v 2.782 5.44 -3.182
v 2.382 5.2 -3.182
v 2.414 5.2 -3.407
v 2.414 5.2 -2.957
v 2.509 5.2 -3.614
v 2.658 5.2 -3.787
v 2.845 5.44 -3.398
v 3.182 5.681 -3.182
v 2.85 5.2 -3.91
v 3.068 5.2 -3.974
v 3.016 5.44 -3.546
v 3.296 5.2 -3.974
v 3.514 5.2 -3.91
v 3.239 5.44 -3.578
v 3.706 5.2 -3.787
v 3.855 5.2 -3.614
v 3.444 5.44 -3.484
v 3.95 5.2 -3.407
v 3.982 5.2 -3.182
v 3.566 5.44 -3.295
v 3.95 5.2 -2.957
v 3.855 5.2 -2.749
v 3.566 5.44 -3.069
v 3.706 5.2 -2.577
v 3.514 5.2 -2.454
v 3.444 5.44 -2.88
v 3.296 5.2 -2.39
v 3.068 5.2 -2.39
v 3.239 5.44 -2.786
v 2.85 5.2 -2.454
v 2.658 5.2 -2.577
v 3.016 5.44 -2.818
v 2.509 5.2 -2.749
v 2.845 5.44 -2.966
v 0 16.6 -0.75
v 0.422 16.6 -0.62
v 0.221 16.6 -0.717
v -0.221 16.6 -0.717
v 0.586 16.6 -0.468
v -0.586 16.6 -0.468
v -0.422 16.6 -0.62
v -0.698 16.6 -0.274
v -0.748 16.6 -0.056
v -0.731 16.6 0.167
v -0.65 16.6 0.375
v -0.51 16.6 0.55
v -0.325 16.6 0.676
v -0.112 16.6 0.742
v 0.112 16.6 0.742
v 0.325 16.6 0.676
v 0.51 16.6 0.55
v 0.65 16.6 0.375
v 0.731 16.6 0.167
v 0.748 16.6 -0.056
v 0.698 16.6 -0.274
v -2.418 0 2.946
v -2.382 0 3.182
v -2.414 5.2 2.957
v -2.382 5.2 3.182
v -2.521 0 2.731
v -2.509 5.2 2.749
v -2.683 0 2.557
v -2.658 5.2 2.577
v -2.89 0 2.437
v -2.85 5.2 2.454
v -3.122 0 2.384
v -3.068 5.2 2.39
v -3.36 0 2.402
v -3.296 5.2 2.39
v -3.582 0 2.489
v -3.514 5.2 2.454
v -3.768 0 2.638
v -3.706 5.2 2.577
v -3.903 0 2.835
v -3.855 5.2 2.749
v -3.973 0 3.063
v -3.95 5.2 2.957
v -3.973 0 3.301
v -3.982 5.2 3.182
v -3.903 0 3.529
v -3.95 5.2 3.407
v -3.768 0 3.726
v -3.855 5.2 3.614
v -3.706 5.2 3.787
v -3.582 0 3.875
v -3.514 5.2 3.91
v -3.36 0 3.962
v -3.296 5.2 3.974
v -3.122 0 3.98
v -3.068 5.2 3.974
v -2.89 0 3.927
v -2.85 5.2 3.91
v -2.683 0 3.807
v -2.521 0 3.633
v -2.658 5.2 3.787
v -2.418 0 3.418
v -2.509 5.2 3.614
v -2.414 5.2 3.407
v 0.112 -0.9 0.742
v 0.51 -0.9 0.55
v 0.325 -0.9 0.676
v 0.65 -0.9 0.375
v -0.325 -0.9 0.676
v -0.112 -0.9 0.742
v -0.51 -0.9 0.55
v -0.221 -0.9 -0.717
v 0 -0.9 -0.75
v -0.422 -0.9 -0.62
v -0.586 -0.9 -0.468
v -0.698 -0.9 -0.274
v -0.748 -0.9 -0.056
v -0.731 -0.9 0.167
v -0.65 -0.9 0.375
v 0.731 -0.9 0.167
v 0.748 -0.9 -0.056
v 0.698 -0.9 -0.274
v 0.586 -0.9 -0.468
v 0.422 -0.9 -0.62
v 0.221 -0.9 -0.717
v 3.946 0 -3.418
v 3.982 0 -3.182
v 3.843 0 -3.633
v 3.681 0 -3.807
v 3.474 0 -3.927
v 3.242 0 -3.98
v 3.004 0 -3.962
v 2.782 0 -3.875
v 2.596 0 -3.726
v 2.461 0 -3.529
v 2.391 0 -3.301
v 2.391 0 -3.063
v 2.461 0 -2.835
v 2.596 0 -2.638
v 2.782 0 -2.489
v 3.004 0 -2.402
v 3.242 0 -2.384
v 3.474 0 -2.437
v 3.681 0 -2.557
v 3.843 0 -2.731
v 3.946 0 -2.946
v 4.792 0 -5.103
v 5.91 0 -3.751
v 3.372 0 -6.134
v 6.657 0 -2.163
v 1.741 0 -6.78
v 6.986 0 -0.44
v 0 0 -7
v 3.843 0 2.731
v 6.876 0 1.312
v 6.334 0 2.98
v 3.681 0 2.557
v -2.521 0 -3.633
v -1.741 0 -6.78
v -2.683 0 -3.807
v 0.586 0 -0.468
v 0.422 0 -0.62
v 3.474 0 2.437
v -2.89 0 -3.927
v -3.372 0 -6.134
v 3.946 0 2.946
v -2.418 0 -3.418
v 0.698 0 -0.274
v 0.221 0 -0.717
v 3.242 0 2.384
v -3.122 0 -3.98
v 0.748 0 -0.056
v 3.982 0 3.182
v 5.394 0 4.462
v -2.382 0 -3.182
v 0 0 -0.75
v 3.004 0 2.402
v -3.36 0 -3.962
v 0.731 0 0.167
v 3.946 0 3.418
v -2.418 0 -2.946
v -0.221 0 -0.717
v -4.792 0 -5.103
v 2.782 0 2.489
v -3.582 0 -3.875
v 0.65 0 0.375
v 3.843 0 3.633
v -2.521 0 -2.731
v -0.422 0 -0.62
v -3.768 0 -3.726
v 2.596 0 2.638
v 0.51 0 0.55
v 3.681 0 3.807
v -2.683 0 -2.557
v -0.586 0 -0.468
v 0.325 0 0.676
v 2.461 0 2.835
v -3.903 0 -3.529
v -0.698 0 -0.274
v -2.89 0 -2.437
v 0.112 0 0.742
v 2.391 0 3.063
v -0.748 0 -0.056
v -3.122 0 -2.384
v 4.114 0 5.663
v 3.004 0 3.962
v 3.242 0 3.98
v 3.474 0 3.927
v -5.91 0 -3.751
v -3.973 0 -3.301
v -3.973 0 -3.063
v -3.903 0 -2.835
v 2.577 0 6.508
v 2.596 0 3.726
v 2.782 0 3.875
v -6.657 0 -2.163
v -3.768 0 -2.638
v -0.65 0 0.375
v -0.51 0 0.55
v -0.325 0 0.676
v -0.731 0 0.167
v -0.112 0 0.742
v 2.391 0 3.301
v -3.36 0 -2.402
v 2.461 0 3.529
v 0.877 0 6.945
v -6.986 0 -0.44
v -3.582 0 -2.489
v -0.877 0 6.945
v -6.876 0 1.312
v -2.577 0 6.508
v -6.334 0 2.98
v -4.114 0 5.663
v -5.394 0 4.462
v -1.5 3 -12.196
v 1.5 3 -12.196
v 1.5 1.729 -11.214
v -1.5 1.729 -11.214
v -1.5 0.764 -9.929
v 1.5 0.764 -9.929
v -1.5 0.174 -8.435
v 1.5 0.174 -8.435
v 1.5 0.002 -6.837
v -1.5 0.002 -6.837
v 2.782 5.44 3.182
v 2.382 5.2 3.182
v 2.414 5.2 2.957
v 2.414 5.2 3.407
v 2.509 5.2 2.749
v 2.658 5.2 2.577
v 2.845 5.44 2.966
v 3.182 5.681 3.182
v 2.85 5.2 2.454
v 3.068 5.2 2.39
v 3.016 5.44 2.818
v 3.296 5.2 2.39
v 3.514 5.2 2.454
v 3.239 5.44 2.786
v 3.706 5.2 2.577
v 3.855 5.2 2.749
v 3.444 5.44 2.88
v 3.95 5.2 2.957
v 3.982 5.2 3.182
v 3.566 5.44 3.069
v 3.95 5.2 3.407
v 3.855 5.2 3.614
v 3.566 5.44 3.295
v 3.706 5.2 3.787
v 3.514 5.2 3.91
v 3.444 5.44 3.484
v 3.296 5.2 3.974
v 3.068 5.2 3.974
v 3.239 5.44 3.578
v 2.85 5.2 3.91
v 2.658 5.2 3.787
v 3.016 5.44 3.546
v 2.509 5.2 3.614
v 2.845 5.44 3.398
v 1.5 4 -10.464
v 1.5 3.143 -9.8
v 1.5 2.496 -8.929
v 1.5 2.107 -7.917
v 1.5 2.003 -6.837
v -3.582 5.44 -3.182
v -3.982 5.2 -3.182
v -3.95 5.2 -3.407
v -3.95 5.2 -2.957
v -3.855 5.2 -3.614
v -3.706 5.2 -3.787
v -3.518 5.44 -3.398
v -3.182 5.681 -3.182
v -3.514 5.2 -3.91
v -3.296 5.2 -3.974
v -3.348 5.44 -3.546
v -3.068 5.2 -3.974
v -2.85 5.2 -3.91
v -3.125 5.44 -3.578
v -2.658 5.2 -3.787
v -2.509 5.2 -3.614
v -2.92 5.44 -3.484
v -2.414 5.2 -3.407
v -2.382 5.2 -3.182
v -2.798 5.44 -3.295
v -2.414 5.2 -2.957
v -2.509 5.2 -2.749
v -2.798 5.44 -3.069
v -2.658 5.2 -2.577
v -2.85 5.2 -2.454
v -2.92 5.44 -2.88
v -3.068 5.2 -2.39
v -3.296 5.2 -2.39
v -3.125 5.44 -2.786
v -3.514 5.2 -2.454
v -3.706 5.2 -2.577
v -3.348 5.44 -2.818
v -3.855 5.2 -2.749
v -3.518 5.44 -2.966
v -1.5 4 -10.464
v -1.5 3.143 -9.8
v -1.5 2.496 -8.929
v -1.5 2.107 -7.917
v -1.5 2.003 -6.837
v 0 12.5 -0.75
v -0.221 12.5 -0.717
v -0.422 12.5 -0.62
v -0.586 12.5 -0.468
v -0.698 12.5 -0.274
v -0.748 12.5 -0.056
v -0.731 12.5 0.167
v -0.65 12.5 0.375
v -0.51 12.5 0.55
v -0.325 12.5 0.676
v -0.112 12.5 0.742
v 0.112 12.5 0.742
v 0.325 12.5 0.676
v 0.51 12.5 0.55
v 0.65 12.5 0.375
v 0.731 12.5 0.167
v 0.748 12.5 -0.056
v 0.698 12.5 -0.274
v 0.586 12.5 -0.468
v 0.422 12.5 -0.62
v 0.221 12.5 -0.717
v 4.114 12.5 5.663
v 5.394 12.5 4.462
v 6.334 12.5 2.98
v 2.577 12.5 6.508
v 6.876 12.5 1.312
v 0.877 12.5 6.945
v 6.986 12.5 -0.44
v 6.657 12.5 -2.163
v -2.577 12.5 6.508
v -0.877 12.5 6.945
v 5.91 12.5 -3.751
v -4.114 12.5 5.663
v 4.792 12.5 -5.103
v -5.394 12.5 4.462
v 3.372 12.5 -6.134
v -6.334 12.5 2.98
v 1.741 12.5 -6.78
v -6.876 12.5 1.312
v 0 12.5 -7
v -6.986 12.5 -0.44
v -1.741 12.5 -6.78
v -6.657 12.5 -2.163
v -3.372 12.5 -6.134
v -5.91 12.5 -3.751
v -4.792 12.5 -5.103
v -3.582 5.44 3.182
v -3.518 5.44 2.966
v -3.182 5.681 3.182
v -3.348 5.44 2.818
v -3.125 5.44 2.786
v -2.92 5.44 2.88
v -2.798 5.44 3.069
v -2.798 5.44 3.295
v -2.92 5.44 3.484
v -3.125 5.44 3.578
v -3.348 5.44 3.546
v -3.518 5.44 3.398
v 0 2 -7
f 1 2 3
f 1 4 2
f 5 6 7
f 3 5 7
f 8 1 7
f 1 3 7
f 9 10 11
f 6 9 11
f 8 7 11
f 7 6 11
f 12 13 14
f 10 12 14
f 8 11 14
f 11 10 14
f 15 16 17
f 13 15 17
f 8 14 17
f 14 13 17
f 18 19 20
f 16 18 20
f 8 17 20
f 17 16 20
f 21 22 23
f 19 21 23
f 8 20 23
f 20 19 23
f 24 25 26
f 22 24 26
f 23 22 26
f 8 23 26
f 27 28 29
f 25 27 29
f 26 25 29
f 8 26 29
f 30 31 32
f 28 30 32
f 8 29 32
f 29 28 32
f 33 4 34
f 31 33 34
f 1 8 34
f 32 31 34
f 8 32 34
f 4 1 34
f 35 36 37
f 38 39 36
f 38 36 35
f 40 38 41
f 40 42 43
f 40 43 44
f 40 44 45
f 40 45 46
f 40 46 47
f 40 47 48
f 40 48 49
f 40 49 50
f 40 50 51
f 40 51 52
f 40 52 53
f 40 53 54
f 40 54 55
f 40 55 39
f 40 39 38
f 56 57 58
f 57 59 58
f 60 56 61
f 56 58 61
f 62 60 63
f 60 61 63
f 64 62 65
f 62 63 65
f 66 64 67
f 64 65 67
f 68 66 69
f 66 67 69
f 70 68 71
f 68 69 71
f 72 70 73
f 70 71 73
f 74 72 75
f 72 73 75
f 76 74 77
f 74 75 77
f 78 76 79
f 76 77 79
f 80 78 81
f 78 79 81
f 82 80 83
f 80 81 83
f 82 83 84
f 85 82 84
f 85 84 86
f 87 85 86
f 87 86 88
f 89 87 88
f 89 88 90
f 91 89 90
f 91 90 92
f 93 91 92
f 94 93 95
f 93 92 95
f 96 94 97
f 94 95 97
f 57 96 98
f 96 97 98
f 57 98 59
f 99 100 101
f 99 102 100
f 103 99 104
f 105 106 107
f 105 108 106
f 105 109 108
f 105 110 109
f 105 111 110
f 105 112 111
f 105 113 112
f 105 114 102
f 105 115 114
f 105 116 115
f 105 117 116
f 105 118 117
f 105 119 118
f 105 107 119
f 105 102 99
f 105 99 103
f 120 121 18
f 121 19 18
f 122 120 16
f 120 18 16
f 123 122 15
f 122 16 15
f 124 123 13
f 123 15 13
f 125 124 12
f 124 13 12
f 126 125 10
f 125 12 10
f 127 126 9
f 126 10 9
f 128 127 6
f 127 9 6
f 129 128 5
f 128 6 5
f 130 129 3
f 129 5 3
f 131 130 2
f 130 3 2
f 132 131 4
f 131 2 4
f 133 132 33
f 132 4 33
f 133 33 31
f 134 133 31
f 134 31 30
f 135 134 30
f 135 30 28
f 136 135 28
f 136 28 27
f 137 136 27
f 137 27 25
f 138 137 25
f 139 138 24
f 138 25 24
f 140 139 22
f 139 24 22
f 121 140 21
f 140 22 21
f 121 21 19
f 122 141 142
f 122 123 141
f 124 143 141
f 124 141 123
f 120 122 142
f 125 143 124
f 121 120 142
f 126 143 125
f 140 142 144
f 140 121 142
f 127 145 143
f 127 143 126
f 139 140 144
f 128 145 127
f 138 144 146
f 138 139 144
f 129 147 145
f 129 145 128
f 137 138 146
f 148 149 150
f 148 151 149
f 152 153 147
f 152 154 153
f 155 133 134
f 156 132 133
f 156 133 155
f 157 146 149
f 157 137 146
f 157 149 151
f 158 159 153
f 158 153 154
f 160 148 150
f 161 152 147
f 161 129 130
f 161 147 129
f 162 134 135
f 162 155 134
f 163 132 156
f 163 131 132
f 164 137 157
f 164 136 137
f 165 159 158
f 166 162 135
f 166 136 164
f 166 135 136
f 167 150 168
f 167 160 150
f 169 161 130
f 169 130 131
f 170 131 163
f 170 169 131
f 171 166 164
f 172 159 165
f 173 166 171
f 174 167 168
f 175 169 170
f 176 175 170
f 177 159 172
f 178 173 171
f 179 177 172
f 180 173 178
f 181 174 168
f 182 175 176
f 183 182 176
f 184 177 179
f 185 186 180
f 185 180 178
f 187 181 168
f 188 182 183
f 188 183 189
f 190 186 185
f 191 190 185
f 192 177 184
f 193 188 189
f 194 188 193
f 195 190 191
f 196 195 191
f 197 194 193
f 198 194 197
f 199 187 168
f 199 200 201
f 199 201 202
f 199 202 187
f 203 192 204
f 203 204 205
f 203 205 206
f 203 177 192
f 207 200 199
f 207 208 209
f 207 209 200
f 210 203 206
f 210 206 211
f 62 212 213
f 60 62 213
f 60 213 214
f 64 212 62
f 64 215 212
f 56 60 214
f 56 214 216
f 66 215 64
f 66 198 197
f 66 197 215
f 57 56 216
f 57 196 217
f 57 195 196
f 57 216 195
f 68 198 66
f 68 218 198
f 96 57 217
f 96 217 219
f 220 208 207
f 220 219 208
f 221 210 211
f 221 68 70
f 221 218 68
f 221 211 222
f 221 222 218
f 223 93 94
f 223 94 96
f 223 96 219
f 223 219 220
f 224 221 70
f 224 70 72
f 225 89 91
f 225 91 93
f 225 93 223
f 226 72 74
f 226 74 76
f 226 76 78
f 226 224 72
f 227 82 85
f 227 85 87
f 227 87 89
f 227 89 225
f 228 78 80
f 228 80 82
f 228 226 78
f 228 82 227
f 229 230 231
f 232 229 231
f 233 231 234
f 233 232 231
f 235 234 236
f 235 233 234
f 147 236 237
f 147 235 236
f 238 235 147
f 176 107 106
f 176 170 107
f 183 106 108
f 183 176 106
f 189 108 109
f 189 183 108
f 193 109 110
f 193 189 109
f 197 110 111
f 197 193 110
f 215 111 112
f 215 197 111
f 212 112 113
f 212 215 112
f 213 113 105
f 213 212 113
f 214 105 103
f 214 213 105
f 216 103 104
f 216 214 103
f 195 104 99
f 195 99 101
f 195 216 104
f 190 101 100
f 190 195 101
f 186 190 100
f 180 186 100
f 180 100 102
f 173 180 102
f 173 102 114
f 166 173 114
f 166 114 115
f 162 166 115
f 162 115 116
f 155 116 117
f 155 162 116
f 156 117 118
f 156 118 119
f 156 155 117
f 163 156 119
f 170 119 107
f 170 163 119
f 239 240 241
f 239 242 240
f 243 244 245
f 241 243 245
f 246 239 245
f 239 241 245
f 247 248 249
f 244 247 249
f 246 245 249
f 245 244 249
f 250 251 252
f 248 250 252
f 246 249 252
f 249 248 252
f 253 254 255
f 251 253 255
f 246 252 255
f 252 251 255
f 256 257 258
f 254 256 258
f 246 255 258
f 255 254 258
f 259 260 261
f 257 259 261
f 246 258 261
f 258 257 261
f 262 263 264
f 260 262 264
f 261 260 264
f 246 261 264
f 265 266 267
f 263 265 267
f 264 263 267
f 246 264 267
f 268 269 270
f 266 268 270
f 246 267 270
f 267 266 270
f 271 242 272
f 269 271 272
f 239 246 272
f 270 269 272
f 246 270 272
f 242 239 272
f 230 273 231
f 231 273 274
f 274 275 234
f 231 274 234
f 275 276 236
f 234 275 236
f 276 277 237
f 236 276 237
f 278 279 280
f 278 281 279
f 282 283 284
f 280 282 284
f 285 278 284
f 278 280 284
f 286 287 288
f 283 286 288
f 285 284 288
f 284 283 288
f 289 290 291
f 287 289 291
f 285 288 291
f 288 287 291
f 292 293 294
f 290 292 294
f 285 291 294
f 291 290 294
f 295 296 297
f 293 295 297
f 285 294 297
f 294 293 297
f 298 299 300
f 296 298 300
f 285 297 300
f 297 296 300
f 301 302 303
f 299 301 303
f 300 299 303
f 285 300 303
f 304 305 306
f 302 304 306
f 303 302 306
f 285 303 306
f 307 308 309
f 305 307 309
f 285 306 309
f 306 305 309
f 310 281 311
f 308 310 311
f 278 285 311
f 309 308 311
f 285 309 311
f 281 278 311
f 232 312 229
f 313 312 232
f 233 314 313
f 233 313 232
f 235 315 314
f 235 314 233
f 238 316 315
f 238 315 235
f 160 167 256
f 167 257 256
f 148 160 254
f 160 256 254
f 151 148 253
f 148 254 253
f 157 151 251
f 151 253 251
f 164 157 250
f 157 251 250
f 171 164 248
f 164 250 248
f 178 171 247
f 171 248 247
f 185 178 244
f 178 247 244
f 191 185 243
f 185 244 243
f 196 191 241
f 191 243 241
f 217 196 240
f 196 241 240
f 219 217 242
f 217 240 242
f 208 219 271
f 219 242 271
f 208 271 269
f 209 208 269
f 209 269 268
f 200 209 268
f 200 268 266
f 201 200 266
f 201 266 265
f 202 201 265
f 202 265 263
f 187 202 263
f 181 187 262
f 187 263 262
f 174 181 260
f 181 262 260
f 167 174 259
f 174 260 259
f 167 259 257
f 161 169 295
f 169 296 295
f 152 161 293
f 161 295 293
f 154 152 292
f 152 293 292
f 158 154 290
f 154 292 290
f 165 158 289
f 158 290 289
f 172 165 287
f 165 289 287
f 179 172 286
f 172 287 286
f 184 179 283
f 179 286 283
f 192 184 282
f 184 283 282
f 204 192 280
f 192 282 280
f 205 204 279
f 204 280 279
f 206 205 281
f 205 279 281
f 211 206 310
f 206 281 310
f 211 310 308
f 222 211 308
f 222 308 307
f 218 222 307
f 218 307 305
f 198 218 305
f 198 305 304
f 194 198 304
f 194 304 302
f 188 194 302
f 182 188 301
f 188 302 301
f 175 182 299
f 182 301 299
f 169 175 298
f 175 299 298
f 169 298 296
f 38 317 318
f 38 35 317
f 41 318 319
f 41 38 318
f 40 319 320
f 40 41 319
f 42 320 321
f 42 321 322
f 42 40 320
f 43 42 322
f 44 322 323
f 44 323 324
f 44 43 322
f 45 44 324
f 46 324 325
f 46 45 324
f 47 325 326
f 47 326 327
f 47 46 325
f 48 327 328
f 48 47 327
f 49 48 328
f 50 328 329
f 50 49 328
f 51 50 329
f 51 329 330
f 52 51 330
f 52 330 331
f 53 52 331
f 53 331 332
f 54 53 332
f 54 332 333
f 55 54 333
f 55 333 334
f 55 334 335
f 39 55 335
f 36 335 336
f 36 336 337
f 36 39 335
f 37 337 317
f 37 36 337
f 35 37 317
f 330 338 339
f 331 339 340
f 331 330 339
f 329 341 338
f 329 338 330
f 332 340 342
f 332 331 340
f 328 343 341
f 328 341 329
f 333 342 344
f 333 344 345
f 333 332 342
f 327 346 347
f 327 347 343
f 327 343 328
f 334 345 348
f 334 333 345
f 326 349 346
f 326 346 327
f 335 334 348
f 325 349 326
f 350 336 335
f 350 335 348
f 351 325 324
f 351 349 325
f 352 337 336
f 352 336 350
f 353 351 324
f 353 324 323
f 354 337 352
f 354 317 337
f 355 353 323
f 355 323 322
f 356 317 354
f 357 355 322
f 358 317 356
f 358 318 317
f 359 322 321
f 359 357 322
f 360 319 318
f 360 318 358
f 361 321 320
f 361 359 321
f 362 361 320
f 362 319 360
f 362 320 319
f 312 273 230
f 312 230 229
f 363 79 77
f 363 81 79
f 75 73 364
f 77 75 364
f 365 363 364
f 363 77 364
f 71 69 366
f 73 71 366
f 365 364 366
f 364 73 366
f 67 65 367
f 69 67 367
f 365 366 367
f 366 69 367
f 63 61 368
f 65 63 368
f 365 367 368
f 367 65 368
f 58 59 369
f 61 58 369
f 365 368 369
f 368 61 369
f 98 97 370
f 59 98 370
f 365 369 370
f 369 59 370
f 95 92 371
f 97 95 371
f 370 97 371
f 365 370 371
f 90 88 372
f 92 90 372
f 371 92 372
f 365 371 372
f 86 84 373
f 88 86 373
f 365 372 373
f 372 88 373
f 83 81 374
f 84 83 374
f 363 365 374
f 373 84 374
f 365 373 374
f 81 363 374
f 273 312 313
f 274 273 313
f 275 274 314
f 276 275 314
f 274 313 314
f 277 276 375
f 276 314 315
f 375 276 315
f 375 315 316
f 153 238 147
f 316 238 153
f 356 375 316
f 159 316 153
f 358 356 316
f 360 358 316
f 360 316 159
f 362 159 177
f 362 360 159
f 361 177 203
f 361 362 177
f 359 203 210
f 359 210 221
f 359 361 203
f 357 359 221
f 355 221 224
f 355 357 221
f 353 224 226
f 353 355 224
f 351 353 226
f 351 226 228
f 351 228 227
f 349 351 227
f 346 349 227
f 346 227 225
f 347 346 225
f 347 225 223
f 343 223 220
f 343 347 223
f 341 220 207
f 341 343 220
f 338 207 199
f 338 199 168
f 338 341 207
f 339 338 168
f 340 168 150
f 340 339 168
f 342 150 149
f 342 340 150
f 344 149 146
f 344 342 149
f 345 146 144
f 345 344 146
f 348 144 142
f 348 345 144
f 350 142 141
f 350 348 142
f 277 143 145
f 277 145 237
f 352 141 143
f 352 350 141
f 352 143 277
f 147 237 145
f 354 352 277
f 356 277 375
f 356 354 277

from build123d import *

# Parameters (mm, degrees)
M2X0_4_TAPPED_HOLE1_D     = 1.6
M2X0_4_TAPPED_HOLE1_DEPTH = 5.2
M2X0_4_TAPPED_HOLE1_TIP   = 0.480688495
SKETCH7_W                 = 3
SKETCH7_H                 = 2
REVOLVE3_ANGLE            = 60
REVOLVE3_OTHER_WAY_ANGLE  = 10


with BuildPart() as part:
    # Sketch1 → Revolve1 (revolve)
    with BuildSketch(Plane.XY):
        Polygon((-0.75, 0), (-7, 0), (-7, 12.5), (-0.75, 12.5), (-0.75, 16.6), (0, 16.6), (0, -0.9), (-0.75, -0.9), align=None)
    revolve(axis=Axis((0, -74.460023863, 0), (0, 1, 0)))

    # M2x0.4 Tapped Hole1
    with Locations(Plane(origin=(0, 0, 0), x_dir=(-1, 0, 0), z_dir=(0, -1, 0))):
        with Locations((3.181980515, -3.181980515), (-3.181980515, -3.181980515), (-3.181980515, 3.181980515), (3.181980515, 3.181980515)):
            Hole(M2X0_4_TAPPED_HOLE1_D / 2, depth=M2X0_4_TAPPED_HOLE1_DEPTH)
            with Locations((0, 0, -(M2X0_4_TAPPED_HOLE1_DEPTH + M2X0_4_TAPPED_HOLE1_TIP / 2))):  # 118° drill point
                Cone(0, M2X0_4_TAPPED_HOLE1_D / 2, M2X0_4_TAPPED_HOLE1_TIP, mode=Mode.SUBTRACT)

    # Sketch7 → Revolve3 (revolve)
    with BuildSketch(Plane(origin=(0, 0, -7), x_dir=(-1, 0, 0), z_dir=(0, 0, -1))):
        with Locations((0, 1)):
            Rectangle(SKETCH7_W, SKETCH7_H)
    revolve(axis=Axis((-7, 6, -7), (1, 0, 0)), revolution_arc=REVOLVE3_ANGLE)

    # Sketch7 → Revolve3 other way (revolve)
    with BuildSketch(Plane(origin=(0, 0, -7), x_dir=(-1, 0, 0), z_dir=(0, 0, -1))):
        with Locations((0, 1)):
            Rectangle(SKETCH7_W, SKETCH7_H)
    revolve(axis=Axis((-7, 6, -7), (-1, 0, 0)), revolution_arc=REVOLVE3_OTHER_WAY_ANGLE)


solid = part.part
